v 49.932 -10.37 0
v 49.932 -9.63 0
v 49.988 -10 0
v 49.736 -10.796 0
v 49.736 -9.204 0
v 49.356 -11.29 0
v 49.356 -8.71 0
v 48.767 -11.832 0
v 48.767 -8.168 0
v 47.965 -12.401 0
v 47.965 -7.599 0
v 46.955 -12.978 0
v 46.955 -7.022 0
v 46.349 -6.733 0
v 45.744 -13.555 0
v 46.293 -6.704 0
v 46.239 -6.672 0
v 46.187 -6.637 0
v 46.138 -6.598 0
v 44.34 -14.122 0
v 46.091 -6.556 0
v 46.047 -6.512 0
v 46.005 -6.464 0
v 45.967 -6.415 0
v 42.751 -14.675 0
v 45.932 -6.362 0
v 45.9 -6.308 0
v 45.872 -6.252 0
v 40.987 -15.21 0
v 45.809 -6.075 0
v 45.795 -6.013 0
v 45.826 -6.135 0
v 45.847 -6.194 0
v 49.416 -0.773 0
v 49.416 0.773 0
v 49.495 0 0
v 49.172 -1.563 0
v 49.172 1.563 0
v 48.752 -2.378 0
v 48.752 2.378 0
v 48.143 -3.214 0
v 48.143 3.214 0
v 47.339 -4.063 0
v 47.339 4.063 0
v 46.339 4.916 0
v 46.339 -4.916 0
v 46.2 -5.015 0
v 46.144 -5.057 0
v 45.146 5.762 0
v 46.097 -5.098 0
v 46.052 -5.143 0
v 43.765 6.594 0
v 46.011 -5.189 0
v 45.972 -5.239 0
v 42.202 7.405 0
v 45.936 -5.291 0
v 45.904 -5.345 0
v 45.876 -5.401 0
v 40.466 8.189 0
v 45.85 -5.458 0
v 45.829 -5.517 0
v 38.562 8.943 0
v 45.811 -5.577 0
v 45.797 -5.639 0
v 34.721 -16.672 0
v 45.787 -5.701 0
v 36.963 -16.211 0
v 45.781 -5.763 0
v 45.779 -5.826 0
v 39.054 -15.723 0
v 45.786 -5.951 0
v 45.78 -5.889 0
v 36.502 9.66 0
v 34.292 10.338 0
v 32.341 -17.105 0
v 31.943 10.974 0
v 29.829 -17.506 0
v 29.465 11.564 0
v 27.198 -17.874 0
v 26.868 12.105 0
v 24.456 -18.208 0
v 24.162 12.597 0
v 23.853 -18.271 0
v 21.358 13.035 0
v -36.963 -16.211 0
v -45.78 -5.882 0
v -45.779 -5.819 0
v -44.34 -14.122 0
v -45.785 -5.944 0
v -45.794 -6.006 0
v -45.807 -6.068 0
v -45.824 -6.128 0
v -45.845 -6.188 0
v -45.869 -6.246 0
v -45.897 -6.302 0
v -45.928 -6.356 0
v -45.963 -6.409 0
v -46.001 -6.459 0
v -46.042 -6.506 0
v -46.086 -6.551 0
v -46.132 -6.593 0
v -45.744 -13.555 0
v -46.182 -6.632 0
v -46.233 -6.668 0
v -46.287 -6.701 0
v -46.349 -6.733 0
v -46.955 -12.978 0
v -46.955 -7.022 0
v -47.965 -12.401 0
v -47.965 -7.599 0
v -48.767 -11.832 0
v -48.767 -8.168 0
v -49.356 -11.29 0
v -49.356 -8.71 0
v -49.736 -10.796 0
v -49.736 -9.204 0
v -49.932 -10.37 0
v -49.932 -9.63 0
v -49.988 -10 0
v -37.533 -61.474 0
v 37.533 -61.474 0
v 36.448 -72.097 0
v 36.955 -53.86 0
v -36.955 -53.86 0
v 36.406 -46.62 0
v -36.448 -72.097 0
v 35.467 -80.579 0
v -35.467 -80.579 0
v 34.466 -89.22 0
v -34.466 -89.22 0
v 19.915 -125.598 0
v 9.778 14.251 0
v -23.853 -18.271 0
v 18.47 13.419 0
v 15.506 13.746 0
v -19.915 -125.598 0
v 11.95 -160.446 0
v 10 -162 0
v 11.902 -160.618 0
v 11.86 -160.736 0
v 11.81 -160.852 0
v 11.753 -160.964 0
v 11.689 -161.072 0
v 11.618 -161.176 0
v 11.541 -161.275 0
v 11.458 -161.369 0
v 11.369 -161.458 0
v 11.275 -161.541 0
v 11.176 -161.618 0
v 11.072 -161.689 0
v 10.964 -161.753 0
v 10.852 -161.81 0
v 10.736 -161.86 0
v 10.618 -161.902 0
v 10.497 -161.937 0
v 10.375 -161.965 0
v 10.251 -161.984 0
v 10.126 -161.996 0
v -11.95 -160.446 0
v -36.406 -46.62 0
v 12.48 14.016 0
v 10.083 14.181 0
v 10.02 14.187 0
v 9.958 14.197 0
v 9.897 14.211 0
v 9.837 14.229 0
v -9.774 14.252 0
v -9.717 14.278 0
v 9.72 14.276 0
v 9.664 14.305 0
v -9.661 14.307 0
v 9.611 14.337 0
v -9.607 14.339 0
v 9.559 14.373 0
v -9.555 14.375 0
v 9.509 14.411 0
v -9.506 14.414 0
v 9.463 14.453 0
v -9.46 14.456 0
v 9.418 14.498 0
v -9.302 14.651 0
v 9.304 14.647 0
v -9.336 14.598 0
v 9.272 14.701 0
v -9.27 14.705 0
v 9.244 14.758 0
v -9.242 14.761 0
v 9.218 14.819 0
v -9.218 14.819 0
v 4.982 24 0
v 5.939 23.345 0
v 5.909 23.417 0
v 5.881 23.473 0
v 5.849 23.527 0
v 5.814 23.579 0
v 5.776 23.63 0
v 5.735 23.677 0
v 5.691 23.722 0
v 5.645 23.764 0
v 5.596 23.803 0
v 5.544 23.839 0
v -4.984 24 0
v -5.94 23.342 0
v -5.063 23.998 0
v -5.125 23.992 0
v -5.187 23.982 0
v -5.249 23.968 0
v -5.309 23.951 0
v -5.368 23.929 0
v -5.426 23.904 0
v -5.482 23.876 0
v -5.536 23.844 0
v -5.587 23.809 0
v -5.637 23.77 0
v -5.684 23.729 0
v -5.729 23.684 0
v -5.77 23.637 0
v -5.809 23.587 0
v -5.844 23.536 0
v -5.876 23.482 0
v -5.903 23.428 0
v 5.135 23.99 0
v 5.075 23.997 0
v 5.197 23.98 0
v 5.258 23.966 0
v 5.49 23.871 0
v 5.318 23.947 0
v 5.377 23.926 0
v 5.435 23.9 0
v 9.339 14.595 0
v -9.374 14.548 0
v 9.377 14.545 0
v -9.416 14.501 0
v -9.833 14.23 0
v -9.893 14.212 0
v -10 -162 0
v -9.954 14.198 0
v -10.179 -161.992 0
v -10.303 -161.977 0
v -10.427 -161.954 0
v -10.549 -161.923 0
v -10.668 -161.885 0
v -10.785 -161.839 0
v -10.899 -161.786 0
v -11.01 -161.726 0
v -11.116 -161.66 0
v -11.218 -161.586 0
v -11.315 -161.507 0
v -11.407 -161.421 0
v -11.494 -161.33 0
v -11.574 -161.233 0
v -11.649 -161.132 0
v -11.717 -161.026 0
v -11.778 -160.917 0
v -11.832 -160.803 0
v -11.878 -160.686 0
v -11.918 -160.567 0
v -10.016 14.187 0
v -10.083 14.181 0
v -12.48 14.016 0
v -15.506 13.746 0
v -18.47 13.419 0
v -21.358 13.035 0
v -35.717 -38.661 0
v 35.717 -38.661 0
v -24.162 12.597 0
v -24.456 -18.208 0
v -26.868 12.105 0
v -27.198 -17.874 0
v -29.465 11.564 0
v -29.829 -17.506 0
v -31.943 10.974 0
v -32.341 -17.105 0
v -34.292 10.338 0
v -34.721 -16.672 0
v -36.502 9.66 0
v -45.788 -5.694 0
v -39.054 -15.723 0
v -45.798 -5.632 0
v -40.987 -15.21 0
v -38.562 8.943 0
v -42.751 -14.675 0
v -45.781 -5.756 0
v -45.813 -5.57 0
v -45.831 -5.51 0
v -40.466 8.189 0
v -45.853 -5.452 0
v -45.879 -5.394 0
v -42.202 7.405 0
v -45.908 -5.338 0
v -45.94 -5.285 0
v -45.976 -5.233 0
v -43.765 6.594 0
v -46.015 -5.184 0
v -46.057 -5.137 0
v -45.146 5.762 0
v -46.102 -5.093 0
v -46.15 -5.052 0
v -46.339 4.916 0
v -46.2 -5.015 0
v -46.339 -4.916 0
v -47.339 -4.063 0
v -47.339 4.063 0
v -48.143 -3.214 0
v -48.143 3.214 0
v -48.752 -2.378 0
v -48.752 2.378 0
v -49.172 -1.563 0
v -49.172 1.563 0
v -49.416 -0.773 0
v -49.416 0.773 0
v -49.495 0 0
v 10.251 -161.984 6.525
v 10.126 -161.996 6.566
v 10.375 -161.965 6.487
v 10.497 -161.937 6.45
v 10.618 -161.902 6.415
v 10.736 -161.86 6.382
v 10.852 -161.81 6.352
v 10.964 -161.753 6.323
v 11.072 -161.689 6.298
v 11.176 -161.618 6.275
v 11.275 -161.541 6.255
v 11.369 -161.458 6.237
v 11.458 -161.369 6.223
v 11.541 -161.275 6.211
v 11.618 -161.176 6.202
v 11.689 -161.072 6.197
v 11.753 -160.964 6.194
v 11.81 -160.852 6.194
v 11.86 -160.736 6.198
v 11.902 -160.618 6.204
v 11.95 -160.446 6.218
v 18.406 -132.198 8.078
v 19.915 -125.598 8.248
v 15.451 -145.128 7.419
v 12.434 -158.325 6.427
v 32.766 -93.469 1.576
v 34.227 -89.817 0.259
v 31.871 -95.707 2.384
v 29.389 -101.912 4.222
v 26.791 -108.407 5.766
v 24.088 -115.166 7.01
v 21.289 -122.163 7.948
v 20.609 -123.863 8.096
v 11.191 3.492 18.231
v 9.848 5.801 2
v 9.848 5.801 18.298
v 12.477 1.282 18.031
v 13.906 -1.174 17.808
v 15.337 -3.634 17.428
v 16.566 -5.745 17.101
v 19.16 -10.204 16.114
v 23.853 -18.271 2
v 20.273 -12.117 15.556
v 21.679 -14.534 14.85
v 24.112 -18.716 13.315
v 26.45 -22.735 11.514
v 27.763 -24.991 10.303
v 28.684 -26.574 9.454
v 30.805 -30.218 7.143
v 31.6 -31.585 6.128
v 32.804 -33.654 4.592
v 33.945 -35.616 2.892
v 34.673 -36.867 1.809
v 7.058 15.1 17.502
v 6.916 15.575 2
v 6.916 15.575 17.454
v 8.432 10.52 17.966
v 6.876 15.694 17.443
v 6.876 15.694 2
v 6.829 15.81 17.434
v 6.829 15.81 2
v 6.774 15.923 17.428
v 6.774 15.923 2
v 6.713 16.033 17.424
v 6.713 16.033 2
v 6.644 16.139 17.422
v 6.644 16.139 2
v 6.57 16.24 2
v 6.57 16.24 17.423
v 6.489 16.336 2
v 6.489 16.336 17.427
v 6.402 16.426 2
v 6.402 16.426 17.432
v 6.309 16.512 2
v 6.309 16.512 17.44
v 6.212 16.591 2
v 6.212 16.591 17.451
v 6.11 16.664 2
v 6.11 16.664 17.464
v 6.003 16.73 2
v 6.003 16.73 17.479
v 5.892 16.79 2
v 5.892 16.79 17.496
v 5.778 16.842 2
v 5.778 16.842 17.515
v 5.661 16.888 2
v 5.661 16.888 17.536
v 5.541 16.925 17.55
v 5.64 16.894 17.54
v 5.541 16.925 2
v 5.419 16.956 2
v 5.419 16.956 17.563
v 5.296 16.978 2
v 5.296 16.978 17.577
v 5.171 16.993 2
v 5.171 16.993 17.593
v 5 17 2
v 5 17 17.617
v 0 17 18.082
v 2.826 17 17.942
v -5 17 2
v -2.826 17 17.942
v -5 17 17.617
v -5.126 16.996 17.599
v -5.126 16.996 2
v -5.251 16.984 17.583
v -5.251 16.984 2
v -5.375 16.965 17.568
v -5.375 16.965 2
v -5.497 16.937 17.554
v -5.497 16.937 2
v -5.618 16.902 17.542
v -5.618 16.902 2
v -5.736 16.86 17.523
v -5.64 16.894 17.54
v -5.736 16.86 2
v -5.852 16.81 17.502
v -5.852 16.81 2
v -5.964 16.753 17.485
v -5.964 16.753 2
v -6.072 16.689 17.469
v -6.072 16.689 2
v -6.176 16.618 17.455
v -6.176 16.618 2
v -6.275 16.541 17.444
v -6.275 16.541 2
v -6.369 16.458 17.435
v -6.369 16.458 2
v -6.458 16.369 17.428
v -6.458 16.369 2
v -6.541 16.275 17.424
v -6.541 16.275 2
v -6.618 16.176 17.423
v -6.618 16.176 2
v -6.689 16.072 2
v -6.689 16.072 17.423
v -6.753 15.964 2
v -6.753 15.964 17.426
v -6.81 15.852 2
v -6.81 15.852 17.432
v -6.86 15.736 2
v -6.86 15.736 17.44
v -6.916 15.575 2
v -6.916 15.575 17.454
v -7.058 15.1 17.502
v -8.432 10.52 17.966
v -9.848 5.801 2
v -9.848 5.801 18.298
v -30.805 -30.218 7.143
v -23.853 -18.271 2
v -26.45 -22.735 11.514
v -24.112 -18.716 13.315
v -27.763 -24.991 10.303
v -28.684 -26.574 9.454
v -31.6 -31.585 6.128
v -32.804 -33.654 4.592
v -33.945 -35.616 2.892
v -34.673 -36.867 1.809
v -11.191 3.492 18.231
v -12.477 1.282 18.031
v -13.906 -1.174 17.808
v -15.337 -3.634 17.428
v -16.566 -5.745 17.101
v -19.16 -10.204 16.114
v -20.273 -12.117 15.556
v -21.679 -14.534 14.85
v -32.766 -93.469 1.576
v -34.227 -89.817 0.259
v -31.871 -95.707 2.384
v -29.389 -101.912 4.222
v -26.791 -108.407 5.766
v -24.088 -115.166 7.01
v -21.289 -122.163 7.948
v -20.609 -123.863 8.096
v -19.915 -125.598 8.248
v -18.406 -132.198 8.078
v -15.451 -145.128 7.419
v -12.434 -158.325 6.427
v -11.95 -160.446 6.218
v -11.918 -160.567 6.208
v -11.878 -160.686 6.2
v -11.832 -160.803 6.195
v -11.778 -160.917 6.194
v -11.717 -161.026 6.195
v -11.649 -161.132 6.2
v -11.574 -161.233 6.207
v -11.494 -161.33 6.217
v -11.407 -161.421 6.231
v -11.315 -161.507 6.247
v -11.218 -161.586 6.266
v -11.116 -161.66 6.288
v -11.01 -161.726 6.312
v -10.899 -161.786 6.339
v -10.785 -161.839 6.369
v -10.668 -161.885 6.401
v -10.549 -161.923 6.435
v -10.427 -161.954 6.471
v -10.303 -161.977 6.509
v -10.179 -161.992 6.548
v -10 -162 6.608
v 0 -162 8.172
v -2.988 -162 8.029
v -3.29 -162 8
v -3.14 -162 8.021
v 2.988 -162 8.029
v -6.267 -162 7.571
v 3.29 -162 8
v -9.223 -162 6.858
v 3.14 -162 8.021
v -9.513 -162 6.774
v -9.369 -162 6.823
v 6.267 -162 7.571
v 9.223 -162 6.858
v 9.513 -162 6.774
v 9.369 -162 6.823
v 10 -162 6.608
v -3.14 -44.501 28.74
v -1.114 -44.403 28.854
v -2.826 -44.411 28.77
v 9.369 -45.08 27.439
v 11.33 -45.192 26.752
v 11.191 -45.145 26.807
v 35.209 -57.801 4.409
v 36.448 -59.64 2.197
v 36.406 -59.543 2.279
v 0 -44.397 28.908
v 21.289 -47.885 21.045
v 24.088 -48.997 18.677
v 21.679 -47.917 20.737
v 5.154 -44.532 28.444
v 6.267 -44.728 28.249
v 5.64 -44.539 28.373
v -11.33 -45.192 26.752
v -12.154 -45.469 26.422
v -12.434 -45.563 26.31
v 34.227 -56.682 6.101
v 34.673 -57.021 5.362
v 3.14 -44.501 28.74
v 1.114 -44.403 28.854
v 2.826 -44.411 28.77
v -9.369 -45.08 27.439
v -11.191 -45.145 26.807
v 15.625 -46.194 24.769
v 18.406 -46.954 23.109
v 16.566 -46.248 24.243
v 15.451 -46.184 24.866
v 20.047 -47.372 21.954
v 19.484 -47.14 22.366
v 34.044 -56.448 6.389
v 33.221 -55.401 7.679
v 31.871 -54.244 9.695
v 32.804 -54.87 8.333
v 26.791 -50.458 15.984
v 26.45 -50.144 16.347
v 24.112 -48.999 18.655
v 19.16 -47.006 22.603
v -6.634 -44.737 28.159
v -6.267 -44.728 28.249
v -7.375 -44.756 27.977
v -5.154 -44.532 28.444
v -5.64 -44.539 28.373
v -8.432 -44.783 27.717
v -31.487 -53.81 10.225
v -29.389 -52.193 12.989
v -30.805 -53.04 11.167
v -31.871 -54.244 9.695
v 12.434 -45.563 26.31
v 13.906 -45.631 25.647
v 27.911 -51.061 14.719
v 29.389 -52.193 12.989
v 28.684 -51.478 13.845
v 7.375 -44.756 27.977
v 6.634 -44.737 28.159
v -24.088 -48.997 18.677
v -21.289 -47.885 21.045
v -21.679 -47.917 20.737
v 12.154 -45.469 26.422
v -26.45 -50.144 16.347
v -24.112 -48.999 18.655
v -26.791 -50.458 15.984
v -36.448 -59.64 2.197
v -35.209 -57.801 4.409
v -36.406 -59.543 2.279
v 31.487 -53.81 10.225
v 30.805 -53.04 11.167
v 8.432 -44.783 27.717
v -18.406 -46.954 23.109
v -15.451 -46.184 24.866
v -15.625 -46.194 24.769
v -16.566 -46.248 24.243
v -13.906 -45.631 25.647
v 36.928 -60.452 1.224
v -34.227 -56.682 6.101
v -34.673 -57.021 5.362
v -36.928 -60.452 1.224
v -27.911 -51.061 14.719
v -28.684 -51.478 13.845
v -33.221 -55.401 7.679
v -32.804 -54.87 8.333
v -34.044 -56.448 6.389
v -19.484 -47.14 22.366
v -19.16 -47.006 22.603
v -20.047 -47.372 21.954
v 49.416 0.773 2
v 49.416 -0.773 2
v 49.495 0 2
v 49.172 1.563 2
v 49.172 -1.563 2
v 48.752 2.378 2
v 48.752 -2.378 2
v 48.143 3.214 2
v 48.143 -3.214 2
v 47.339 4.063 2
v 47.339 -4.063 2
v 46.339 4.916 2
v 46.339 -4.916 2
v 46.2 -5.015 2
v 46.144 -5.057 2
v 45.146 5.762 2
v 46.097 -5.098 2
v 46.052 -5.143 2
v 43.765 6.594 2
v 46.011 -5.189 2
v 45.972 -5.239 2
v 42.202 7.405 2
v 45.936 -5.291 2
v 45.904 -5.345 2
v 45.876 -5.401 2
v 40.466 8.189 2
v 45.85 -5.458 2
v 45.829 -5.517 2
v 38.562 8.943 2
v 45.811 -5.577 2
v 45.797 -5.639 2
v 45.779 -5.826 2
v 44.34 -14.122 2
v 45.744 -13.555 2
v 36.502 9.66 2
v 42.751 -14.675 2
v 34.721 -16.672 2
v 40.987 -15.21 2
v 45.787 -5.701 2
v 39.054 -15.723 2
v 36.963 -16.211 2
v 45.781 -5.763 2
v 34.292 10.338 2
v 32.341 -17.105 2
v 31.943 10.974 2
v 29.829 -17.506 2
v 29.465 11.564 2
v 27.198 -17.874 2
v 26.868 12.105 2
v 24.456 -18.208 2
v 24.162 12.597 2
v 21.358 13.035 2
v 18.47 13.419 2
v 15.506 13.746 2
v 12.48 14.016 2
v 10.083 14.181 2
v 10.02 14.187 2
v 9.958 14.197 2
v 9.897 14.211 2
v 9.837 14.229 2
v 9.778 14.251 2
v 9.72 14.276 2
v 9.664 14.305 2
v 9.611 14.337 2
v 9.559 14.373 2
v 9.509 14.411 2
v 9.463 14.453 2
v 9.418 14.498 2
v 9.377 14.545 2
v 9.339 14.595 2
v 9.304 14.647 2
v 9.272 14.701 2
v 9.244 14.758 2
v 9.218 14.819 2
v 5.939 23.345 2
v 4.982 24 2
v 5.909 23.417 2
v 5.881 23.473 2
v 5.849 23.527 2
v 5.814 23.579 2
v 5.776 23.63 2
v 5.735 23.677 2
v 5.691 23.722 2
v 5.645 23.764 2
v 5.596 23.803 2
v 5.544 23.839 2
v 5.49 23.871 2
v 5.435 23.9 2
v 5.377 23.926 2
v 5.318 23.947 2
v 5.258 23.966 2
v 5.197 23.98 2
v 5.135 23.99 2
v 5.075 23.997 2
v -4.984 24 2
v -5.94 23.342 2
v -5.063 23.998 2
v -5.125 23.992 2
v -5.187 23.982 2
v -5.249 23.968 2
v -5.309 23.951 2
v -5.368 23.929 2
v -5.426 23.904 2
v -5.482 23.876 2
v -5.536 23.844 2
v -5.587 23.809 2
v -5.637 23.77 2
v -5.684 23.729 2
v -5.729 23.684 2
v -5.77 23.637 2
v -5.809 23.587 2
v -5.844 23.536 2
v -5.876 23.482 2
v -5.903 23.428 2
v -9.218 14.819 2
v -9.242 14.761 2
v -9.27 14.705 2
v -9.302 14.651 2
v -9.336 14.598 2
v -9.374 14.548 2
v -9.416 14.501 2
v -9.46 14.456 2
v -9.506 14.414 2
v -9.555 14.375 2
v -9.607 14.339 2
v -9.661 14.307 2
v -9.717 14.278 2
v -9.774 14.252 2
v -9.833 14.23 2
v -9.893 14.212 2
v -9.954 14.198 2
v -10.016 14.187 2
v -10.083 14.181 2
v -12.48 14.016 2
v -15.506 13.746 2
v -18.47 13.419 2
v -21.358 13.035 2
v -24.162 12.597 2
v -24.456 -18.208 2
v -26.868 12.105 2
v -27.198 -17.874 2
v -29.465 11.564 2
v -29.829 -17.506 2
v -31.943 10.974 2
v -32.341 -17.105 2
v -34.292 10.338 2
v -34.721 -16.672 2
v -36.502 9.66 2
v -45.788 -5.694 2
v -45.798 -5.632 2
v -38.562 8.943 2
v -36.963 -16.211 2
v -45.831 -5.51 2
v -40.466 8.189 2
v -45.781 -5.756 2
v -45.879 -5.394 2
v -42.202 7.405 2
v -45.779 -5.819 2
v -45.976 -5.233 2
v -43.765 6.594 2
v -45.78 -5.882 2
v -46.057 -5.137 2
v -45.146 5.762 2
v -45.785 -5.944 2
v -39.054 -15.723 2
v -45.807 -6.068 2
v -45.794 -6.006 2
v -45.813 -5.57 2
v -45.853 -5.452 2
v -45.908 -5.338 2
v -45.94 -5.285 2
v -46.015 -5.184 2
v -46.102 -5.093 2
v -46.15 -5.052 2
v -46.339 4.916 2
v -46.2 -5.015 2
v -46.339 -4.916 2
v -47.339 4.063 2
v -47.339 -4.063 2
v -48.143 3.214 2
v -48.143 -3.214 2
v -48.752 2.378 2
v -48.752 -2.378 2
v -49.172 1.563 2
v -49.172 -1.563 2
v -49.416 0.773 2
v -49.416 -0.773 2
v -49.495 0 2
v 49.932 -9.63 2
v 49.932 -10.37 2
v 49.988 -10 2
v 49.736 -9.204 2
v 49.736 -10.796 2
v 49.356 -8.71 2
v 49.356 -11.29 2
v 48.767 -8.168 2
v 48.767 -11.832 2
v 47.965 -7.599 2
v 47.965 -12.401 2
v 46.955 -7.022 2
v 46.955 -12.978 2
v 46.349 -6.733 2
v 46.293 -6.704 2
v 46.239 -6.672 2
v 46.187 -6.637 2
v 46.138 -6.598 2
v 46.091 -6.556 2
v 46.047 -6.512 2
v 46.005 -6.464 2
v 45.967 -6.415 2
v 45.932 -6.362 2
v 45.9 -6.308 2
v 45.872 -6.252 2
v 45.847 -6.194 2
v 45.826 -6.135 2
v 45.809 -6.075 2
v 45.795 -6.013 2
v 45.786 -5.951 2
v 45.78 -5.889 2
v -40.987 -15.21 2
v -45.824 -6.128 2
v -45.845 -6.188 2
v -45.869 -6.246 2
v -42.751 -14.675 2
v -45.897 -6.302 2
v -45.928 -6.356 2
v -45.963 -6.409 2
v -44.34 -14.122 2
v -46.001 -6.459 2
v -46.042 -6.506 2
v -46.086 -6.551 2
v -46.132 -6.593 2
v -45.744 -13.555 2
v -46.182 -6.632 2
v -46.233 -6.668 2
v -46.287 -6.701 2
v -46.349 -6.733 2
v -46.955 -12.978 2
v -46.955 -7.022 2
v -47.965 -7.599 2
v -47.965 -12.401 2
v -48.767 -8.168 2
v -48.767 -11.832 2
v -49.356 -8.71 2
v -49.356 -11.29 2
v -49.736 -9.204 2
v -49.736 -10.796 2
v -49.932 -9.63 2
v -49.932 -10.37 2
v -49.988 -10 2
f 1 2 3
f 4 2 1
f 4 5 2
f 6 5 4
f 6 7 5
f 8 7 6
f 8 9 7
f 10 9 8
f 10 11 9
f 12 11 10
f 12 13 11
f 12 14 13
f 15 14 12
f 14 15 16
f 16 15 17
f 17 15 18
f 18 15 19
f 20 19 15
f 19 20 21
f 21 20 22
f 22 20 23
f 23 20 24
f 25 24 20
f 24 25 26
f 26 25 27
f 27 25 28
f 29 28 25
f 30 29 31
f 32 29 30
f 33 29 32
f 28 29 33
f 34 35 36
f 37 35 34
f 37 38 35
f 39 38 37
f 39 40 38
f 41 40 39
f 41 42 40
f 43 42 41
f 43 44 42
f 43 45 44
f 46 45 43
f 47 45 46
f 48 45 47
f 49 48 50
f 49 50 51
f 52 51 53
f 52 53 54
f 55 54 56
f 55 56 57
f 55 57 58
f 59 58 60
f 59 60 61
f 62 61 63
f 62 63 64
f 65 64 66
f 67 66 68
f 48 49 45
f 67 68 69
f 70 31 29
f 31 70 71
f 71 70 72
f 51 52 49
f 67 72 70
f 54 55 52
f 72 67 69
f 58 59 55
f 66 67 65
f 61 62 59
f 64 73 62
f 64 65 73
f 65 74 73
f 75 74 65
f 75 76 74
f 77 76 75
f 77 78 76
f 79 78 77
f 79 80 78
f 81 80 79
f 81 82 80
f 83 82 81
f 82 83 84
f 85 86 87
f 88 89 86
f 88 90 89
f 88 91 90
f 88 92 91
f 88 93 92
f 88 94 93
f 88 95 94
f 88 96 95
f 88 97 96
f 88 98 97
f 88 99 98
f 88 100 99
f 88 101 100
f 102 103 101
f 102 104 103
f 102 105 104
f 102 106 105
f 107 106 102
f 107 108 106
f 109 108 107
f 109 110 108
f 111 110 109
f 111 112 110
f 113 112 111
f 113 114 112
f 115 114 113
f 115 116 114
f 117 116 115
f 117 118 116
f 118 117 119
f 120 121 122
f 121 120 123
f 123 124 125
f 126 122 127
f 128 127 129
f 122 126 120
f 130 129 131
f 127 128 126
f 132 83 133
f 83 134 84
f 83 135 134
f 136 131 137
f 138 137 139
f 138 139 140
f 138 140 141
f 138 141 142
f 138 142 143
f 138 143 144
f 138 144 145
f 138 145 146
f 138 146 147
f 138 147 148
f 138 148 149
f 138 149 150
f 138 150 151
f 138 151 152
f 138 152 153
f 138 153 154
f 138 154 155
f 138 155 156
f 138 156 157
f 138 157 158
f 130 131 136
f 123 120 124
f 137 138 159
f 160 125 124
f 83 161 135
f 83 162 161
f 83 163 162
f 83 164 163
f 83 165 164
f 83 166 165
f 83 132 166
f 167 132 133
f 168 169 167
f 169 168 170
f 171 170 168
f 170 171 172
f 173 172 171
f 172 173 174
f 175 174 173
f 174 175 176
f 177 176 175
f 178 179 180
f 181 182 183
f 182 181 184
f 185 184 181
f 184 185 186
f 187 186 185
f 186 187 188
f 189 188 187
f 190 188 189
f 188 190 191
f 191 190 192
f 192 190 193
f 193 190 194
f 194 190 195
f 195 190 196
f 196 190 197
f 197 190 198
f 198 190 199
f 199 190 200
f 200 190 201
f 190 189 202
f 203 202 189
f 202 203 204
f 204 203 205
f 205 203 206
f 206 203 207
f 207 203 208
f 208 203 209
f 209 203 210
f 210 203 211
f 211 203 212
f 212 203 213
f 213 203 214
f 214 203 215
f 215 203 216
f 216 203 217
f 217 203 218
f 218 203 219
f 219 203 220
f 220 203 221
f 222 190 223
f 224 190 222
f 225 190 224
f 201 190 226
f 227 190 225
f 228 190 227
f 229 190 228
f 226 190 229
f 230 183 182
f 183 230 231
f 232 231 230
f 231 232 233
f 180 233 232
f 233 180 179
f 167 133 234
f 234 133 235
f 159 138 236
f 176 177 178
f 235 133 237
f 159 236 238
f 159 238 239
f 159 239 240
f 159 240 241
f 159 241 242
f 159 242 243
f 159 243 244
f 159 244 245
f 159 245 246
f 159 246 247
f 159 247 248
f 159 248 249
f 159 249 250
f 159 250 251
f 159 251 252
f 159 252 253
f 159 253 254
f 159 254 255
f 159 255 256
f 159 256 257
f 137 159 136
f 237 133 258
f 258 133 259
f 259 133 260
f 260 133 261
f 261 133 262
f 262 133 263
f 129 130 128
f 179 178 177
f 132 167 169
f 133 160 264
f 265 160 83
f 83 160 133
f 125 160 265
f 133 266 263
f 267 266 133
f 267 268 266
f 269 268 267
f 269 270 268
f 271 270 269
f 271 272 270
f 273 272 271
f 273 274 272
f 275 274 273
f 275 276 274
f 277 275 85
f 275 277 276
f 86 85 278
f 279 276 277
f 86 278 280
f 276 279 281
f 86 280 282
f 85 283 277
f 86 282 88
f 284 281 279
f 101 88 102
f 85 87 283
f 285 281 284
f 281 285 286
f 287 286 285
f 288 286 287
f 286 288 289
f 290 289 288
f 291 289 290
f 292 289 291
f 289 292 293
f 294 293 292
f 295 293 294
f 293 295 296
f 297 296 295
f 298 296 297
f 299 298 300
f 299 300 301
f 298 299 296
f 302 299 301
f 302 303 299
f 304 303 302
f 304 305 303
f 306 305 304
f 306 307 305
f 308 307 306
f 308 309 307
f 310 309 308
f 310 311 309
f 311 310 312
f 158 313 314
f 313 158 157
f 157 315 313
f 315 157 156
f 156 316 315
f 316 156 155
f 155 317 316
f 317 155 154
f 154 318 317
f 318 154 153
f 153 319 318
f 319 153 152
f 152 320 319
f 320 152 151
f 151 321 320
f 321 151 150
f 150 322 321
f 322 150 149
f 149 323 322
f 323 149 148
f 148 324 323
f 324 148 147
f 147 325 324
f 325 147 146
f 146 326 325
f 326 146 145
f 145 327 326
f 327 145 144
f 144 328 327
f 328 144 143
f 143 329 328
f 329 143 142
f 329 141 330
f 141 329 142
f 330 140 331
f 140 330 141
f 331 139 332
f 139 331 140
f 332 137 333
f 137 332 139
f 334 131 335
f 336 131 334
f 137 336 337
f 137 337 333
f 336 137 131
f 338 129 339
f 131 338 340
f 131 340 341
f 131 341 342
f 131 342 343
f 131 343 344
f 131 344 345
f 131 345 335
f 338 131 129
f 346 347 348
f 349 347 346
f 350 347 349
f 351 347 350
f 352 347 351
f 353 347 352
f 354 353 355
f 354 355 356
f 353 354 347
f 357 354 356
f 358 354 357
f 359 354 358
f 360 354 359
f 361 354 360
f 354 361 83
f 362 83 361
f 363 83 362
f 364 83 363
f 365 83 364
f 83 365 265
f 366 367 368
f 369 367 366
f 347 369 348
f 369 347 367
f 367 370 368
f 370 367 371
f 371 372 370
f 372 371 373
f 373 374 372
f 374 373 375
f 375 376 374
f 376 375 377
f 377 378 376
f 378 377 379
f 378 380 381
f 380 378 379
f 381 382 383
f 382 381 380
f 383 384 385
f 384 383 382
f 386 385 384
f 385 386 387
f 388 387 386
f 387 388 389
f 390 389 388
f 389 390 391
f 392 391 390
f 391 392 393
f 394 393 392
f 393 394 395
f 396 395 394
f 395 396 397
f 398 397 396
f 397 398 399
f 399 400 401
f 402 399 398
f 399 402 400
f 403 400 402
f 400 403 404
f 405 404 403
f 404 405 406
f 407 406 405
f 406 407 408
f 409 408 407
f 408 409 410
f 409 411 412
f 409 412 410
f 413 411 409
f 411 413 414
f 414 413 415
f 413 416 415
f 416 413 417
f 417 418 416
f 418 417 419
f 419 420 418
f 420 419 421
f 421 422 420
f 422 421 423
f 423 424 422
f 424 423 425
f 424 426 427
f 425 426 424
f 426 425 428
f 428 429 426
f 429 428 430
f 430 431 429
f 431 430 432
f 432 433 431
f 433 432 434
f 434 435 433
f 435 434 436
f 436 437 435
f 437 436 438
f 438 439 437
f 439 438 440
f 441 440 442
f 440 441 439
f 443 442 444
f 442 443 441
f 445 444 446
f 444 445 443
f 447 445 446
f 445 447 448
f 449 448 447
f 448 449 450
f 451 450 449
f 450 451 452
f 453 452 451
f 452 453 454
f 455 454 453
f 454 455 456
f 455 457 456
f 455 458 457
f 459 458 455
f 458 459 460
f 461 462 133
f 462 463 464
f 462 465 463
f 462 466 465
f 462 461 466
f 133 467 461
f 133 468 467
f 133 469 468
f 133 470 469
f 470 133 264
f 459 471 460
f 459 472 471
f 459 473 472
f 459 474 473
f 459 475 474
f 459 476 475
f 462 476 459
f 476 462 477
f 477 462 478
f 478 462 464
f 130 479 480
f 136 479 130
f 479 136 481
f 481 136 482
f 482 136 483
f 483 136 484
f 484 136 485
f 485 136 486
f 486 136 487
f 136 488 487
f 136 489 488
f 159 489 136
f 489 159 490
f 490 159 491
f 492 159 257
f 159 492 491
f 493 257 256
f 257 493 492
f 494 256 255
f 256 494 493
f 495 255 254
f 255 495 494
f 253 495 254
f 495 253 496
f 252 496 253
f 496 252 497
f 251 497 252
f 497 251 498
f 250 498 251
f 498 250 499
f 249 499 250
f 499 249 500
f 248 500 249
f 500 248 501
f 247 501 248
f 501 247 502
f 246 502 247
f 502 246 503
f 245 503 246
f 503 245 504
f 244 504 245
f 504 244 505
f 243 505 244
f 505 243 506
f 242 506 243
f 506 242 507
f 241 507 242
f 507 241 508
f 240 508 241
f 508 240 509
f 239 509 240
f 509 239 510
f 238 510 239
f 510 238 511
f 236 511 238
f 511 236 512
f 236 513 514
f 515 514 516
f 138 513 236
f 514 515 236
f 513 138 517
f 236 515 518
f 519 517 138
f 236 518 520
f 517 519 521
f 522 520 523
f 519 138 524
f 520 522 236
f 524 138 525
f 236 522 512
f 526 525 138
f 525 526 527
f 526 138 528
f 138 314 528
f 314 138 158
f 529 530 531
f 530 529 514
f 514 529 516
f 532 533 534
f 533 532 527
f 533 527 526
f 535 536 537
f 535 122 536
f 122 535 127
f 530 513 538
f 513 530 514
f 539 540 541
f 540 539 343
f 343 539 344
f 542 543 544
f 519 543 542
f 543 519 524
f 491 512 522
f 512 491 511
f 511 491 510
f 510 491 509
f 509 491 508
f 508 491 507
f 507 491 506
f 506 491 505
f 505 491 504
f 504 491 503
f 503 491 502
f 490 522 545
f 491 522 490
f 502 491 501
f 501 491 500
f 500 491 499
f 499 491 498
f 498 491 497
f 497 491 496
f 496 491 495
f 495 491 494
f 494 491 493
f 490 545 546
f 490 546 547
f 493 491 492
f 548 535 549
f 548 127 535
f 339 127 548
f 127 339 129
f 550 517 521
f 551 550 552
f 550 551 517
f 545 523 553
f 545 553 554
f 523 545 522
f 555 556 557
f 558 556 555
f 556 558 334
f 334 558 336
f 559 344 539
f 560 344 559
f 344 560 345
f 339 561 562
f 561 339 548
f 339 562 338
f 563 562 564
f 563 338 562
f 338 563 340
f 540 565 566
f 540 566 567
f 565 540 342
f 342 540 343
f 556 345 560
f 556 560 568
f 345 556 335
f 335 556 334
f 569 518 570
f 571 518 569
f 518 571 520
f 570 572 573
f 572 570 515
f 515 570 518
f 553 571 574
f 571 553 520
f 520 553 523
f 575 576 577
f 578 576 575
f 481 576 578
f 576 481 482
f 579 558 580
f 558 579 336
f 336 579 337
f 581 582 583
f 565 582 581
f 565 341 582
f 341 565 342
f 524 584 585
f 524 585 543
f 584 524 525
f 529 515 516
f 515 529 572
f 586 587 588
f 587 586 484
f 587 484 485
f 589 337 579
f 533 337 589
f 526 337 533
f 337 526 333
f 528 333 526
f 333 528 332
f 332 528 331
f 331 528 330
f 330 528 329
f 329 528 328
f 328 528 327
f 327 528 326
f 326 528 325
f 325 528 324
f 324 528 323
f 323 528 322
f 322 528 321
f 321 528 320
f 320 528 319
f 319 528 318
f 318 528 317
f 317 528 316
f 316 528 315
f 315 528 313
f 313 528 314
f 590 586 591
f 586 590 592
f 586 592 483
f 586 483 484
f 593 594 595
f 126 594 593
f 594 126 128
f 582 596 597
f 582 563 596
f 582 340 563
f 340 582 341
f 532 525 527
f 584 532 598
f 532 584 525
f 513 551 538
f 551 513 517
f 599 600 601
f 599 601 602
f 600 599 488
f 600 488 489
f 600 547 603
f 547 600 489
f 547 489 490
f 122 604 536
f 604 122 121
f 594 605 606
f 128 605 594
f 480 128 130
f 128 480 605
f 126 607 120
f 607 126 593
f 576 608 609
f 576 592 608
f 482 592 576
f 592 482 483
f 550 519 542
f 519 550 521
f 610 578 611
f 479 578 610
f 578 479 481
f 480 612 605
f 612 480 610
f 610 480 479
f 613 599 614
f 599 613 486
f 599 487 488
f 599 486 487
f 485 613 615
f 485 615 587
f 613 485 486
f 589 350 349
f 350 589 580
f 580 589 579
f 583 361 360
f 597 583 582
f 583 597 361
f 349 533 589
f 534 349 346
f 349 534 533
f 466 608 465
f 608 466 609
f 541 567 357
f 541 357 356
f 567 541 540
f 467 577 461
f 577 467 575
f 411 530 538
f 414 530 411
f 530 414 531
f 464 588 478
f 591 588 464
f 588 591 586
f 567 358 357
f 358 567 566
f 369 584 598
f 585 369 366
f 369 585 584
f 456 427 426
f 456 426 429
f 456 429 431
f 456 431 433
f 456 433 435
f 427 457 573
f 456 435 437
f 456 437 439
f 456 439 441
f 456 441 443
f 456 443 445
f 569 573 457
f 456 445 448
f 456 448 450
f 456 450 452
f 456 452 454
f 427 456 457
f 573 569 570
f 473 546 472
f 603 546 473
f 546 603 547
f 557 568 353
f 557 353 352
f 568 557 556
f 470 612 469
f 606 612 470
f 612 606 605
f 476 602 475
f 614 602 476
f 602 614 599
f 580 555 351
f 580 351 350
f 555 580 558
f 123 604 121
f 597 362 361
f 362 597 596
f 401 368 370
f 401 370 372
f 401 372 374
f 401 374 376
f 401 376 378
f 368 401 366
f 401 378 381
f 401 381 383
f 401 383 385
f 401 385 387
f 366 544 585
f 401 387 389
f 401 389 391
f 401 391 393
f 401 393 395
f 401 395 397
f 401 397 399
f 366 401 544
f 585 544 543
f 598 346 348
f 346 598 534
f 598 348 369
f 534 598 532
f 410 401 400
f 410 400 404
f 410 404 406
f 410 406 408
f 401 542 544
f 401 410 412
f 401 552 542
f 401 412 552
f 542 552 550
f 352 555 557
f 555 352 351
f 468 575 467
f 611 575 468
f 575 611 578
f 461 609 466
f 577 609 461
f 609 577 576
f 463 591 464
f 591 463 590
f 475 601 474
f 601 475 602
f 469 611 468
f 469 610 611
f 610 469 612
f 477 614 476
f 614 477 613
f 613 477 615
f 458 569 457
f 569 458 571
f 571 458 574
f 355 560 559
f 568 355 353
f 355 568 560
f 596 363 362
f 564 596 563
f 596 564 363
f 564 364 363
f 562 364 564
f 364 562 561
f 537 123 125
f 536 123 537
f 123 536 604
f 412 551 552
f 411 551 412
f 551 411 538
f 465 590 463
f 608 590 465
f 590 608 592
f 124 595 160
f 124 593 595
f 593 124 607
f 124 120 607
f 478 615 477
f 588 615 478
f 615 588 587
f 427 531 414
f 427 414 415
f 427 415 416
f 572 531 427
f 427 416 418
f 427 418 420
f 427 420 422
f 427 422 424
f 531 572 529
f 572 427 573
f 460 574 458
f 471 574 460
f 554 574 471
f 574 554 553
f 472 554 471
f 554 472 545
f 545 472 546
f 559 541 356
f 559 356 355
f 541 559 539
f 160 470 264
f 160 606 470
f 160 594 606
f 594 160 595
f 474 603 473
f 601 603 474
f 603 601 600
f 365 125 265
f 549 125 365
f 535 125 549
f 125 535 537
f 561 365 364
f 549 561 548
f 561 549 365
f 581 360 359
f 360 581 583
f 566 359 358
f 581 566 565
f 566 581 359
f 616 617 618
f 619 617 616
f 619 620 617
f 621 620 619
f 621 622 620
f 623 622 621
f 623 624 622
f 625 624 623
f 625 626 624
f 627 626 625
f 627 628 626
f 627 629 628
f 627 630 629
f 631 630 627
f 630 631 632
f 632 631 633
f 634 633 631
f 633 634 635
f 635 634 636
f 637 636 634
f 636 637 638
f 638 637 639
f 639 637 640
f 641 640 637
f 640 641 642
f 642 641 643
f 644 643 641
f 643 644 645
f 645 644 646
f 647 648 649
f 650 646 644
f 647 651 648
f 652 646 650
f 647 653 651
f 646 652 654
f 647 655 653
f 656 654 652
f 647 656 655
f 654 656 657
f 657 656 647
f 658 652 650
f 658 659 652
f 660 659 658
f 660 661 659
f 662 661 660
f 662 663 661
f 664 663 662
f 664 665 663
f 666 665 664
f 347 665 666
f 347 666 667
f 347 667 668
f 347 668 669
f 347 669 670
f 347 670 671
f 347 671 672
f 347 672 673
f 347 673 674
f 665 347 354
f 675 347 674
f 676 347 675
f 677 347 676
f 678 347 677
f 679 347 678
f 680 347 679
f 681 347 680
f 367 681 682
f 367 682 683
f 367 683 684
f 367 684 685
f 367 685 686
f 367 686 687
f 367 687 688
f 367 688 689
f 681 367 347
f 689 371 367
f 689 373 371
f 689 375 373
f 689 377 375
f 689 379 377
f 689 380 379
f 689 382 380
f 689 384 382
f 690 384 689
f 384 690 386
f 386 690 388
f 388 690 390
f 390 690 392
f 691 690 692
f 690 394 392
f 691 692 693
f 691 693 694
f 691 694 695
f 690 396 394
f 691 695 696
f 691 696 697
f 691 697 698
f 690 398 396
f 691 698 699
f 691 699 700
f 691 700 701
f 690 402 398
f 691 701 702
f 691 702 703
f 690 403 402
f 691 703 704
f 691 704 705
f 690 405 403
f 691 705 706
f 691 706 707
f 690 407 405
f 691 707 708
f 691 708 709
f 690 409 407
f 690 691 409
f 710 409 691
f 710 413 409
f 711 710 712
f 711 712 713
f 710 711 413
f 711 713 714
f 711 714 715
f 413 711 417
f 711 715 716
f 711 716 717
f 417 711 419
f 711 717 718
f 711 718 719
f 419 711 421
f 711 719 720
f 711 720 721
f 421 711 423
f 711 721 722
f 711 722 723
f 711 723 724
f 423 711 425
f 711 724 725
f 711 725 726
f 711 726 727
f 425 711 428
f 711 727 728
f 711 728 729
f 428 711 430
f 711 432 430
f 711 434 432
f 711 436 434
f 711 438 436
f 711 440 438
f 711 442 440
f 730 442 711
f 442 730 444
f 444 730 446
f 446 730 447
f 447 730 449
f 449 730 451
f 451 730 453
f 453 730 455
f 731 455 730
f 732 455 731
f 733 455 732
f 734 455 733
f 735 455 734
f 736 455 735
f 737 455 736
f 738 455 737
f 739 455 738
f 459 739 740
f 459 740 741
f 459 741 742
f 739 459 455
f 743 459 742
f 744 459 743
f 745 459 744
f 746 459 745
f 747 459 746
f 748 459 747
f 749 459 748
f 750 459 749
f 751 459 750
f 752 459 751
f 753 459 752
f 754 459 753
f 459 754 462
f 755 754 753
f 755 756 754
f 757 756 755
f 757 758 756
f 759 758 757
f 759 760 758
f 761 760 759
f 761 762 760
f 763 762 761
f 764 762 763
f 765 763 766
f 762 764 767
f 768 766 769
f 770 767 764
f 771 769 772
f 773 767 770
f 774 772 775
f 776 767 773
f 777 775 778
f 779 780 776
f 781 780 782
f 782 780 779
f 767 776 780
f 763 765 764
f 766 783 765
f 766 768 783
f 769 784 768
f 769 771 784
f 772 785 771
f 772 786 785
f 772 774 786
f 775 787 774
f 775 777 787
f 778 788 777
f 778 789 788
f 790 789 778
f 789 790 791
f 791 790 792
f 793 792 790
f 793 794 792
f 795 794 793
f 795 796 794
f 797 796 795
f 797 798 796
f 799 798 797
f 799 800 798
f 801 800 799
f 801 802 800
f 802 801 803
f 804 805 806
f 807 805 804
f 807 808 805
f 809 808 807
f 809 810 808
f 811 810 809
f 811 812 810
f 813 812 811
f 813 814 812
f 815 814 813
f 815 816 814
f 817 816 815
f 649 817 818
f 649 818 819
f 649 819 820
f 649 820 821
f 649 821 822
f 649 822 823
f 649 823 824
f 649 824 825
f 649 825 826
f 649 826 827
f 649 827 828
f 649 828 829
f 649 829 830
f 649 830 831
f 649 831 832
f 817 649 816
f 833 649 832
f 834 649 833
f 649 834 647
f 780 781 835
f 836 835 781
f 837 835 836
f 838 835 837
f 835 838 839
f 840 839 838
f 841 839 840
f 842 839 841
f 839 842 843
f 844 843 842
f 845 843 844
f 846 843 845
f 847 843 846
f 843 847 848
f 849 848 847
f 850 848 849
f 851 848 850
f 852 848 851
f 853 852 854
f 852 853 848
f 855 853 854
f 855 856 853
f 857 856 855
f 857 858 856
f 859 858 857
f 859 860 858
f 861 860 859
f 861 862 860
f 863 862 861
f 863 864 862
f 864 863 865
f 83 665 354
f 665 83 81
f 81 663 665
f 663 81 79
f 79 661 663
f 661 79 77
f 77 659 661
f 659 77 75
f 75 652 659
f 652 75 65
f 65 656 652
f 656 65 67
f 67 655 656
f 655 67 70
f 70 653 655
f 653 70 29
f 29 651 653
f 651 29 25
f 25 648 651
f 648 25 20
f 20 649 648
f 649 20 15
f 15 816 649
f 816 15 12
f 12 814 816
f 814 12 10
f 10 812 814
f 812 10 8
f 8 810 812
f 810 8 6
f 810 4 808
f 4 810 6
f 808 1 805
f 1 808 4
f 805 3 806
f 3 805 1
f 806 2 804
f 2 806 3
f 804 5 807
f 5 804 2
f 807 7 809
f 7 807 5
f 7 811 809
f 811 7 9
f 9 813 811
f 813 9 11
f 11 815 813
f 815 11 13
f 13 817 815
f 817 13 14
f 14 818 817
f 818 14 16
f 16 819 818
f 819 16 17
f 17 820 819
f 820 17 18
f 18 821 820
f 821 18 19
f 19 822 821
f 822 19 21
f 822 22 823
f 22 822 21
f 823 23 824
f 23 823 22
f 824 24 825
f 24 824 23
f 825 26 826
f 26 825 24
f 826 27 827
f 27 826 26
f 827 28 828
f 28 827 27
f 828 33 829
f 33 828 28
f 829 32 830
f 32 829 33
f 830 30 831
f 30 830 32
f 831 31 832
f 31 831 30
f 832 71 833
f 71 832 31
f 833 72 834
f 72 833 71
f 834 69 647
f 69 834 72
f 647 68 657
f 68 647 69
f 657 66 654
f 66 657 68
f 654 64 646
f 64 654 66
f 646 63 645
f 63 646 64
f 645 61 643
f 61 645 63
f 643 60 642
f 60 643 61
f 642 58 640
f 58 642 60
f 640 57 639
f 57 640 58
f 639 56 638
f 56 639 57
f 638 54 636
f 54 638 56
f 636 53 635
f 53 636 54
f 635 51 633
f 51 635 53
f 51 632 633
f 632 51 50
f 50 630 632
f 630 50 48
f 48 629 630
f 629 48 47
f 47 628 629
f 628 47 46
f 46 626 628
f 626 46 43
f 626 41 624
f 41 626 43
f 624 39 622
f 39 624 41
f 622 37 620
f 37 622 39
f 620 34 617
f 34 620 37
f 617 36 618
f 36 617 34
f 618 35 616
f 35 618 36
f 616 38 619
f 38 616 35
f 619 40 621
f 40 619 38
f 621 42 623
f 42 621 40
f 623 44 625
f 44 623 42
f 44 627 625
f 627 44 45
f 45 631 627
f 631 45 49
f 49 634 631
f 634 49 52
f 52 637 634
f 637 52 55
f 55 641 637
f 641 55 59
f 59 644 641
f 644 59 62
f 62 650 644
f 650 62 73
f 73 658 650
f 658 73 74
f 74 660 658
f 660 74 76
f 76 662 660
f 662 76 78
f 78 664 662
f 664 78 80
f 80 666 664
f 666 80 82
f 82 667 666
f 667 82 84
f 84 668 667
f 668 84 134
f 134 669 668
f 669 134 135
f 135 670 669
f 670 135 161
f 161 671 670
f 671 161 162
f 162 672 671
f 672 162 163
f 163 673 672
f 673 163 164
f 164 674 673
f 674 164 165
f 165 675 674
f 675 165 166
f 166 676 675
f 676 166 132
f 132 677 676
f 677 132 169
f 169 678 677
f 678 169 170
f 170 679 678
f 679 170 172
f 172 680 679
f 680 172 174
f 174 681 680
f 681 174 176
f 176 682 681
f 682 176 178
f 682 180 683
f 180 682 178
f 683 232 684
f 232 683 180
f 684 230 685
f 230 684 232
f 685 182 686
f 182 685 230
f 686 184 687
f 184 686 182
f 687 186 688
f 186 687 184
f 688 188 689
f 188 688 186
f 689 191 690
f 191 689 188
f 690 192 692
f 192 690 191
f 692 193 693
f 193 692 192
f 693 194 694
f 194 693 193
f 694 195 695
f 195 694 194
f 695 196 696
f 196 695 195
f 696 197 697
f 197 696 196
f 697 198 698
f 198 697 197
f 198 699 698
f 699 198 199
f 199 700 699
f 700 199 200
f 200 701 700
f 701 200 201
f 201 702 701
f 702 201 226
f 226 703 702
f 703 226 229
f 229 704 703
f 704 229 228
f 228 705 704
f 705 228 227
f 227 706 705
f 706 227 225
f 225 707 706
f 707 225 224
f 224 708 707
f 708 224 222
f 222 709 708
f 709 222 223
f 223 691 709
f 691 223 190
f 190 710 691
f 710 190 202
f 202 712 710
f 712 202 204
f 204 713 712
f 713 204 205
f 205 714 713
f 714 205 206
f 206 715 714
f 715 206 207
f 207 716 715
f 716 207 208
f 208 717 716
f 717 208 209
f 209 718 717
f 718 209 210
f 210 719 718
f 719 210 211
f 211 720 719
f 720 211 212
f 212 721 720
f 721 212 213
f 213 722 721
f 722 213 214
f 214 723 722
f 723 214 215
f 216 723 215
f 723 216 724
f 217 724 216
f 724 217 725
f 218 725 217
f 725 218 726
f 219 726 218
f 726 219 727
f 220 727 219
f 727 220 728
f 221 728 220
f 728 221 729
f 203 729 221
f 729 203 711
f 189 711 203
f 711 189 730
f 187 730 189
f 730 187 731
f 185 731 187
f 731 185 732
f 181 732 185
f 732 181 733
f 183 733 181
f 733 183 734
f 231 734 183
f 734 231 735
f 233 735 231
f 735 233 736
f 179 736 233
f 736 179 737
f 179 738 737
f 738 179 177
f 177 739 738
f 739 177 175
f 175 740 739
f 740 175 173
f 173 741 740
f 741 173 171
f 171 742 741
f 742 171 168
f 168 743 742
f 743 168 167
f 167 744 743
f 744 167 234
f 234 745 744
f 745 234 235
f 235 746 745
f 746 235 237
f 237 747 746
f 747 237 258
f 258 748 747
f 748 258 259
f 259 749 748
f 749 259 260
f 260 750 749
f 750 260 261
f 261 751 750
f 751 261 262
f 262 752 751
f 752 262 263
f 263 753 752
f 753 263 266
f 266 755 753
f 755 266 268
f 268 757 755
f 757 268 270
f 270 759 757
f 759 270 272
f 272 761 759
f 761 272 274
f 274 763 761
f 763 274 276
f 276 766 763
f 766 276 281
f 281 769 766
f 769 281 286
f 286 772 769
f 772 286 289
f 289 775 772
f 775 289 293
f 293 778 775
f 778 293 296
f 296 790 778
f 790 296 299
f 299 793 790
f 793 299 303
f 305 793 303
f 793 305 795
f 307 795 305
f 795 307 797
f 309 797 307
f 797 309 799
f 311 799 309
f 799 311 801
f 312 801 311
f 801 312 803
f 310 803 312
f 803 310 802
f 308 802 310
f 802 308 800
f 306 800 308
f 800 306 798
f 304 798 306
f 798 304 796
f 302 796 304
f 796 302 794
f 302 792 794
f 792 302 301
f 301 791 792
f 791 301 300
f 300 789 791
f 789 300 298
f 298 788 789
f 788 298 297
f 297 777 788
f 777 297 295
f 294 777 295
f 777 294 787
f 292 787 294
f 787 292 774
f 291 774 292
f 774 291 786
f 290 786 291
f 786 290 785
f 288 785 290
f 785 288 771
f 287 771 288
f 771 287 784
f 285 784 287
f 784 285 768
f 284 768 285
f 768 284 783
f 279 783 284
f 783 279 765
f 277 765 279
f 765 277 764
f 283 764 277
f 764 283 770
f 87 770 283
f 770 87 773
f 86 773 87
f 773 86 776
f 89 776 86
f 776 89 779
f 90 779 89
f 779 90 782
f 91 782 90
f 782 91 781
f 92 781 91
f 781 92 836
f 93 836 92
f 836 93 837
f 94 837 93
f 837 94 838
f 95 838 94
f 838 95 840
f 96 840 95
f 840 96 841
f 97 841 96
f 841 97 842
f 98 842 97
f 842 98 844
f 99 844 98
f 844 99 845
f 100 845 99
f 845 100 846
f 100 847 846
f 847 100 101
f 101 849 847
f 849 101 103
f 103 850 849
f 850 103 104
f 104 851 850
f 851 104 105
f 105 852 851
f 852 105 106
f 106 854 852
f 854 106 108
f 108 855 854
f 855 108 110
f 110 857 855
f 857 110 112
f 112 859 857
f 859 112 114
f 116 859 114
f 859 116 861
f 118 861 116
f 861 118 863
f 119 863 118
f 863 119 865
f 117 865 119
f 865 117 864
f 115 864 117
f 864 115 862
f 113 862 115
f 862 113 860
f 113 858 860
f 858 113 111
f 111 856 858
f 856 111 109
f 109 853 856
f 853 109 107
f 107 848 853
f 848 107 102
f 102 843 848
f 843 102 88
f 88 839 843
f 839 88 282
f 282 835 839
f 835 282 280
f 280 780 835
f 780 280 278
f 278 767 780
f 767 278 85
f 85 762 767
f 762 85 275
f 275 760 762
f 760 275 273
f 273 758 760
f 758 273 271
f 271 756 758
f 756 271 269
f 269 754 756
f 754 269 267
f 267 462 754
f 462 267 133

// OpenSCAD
$fn=100;

module BasePlate() {
    offset(r=-1)
    union() {
        resize([101, 31, 0])
        circle(r=10, center=true);

        translate([0, -10, 0])
        resize([102, 21, 0])
        circle(r=10, center=true);

        offset(r=2)
        polygon([
            [-5,23],
            [-10,10],
            [10,10],
            [5,23]
        ]);
    };
}

module TopPoly() {
    polygon([
        [0,15],
        [-5,15],
        [-8,5],
        [-40,-50],
        [-40,-70],
        [-18,-125],
        [-10,-160],
        [0, -160]
    ]);
}

module TopPlate() {
    offset(r=2)
    union() {
        TopPoly();
        mirror([1,0,0]) TopPoly();
    };
};

intersection() {
    intersection() {
        linear_extrude(height=30)
        TopPlate();

        translate([0, -60, -50])
        rotate([-80,0,0])
        resize([100,150,200])
        cylinder(d=100, h=200, center=true);
    };

    translate([0, 0, -50])
    rotate([80,0,0])
    resize([90,140,400])
    cylinder(d=100, h=200, center=true);

};


linear_extrude(height=2)
BasePlate();


/* How to make the round parts
 *
difference() {
intersection() {

    linear_extrude(h=50)
    BasePlate();
    
    translate([0, 0, 30])
    rotate([90,0,0])
    cylinder(d=100, h=50, center=true);
}

    translate([0, 0, 30])
    rotate([90,0,0])
    cylinder(d=90, h=50, center=true);
}
*/
